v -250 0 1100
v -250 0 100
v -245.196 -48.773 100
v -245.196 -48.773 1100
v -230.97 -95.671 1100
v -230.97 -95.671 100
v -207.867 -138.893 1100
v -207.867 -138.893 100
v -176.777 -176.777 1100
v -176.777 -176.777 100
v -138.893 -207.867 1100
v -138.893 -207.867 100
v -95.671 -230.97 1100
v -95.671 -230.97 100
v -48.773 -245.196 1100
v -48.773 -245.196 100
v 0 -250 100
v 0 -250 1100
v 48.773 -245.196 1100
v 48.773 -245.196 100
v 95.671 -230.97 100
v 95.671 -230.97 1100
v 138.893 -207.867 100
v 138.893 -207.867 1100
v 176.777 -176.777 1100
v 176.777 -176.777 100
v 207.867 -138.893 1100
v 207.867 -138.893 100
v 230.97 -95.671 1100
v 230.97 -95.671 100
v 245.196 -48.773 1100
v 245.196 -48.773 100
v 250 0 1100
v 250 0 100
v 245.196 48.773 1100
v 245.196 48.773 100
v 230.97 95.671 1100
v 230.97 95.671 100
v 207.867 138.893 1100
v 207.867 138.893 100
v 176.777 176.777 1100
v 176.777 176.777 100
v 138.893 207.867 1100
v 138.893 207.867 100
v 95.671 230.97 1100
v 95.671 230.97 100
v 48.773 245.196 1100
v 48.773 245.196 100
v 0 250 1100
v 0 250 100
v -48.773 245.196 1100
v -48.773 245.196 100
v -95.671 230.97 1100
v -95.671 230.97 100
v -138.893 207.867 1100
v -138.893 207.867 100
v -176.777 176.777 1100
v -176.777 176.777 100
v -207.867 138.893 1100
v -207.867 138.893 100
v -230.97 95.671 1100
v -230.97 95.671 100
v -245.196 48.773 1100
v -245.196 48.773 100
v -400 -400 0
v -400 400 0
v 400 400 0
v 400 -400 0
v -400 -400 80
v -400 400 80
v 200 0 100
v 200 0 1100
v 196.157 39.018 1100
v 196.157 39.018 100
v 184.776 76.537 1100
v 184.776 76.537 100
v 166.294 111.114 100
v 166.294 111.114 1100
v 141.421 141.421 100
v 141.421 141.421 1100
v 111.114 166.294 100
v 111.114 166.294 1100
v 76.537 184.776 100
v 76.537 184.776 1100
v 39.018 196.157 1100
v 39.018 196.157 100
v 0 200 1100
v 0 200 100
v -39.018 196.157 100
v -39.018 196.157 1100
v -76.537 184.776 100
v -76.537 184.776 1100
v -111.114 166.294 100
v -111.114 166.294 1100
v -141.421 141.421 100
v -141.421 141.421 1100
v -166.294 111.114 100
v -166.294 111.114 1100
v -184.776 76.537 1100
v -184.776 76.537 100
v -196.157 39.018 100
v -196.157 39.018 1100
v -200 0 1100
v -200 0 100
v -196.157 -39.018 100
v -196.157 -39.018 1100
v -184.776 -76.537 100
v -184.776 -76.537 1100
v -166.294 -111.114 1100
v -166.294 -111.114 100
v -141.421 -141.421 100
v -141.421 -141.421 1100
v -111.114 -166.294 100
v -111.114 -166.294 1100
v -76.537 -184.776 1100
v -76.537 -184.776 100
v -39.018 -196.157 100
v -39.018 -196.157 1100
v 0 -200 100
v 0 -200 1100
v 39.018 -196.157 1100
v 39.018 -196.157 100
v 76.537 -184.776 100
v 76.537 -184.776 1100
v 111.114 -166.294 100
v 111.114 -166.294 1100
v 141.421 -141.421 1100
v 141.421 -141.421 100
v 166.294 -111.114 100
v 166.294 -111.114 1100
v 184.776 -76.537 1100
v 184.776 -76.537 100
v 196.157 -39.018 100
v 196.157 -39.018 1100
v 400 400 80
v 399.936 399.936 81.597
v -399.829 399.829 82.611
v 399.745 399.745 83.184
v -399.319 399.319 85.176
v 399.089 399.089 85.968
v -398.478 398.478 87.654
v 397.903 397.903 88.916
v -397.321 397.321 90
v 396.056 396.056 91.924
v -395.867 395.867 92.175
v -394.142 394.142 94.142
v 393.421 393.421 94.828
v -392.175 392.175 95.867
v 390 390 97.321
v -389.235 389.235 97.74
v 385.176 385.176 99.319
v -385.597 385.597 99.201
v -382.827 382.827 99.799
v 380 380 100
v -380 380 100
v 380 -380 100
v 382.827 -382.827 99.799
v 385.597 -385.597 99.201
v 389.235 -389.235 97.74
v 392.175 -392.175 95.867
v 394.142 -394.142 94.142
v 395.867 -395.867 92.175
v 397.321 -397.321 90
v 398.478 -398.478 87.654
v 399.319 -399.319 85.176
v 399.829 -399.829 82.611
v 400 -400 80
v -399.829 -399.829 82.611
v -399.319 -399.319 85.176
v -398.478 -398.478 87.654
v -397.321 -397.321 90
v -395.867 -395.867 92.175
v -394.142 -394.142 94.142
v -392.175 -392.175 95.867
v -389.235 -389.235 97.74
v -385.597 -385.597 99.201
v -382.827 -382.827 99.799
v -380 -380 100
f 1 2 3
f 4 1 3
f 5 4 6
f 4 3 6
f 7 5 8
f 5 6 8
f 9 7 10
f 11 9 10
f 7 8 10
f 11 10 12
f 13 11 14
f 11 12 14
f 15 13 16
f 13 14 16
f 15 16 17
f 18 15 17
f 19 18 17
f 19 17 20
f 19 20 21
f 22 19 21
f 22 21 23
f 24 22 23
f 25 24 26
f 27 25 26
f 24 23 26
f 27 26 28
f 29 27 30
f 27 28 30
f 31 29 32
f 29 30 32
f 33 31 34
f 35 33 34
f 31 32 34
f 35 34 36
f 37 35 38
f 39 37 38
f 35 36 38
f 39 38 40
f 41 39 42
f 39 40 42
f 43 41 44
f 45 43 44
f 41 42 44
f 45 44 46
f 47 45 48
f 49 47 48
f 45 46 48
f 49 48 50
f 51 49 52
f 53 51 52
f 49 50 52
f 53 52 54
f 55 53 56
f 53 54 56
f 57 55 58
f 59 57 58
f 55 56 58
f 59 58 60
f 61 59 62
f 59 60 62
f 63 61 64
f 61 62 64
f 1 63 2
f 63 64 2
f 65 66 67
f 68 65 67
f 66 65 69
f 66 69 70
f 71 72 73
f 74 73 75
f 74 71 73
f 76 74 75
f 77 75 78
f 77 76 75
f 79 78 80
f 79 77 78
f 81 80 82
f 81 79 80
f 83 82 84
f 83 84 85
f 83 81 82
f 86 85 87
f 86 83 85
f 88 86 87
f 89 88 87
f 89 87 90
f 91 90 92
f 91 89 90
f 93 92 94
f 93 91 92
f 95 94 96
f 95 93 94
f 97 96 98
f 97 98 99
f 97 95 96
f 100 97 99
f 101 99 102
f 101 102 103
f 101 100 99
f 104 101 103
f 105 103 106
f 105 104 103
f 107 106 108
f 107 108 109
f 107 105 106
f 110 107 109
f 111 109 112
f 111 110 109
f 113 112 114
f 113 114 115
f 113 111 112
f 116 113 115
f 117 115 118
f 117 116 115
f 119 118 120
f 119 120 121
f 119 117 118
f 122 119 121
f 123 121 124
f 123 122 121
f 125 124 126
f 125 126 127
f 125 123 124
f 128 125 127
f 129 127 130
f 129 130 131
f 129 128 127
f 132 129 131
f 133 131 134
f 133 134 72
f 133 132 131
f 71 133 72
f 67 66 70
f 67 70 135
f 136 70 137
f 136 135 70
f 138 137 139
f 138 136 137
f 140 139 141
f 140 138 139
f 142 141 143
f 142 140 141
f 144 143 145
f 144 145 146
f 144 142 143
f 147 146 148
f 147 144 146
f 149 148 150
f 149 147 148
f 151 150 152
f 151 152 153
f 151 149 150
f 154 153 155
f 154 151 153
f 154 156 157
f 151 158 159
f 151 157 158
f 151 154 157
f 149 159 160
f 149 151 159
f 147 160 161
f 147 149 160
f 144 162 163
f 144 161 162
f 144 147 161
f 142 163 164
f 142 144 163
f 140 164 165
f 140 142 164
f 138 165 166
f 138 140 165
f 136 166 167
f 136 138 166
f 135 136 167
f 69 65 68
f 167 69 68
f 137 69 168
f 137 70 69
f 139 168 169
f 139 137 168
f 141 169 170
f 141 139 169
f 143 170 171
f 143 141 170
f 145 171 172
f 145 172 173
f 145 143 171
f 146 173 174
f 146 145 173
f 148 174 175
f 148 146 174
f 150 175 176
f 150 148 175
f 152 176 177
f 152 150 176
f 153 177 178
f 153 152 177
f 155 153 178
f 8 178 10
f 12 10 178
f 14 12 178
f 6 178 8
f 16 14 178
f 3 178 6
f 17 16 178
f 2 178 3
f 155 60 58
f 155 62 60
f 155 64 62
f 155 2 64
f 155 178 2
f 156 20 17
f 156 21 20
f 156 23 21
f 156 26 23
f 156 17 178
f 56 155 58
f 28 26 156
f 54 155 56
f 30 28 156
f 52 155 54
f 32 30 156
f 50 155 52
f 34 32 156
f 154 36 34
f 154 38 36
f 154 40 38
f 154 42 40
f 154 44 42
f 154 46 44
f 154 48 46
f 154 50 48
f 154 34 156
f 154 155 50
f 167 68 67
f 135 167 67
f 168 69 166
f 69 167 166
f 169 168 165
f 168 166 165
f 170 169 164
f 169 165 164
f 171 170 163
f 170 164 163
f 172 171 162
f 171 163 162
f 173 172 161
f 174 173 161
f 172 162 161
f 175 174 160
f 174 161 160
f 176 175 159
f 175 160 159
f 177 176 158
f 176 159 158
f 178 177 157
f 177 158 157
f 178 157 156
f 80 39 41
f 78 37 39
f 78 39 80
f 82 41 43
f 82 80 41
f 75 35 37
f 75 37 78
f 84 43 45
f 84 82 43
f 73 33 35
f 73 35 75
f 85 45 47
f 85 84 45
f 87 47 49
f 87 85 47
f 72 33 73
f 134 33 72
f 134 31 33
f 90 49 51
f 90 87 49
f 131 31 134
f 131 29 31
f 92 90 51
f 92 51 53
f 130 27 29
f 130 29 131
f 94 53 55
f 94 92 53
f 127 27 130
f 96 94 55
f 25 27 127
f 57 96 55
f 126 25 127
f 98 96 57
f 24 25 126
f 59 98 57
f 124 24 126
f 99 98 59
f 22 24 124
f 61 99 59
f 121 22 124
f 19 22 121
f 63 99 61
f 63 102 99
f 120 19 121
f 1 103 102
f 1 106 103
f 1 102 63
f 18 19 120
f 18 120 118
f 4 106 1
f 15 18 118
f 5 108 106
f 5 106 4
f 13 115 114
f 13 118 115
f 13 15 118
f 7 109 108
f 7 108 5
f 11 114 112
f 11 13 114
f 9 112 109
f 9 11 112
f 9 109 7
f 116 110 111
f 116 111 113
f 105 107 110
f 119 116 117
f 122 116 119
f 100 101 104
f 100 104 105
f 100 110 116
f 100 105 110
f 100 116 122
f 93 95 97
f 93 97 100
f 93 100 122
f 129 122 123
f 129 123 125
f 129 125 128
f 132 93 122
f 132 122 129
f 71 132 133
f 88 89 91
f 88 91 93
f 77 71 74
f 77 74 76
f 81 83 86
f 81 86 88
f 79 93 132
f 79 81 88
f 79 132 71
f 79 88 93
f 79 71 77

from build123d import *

# Parameters (mm, degrees)
SKETCH1_W           = 800
SKETCH1_H           = 800
BOSS_EXTRUDE1_DEPTH = 100
SKETCH2_R           = 250
SKETCH2_R_2         = 200
BOSS_EXTRUDE2_DEPTH = 1000
FILLET1_R           = 20


with BuildPart() as part:
    # Sketch1 → Boss-Extrude1 (new body)
    with BuildSketch(Plane.XY):
        Rectangle(SKETCH1_W, SKETCH1_H)
    extrude(amount=BOSS_EXTRUDE1_DEPTH)

    # Sketch2 → Boss-Extrude2 (add)
    with BuildSketch(Plane.XY.offset(100)):
        with Locations(Location((0, 0, 0), (0, 0, 180))):
            Circle(SKETCH2_R)
        Circle(SKETCH2_R_2, mode=Mode.SUBTRACT)
    extrude(amount=BOSS_EXTRUDE2_DEPTH)

    # Fillet1
    fillet1_edges = [part.edges().sort_by_distance(p)[0] for p in [
        (-400, 0, 100),
        (0, -400, 100),
        (400, 0, 100),
        (0, 400, 100),
    ]]
    fillet(fillet1_edges, radius=FILLET1_R)


solid = part.part
